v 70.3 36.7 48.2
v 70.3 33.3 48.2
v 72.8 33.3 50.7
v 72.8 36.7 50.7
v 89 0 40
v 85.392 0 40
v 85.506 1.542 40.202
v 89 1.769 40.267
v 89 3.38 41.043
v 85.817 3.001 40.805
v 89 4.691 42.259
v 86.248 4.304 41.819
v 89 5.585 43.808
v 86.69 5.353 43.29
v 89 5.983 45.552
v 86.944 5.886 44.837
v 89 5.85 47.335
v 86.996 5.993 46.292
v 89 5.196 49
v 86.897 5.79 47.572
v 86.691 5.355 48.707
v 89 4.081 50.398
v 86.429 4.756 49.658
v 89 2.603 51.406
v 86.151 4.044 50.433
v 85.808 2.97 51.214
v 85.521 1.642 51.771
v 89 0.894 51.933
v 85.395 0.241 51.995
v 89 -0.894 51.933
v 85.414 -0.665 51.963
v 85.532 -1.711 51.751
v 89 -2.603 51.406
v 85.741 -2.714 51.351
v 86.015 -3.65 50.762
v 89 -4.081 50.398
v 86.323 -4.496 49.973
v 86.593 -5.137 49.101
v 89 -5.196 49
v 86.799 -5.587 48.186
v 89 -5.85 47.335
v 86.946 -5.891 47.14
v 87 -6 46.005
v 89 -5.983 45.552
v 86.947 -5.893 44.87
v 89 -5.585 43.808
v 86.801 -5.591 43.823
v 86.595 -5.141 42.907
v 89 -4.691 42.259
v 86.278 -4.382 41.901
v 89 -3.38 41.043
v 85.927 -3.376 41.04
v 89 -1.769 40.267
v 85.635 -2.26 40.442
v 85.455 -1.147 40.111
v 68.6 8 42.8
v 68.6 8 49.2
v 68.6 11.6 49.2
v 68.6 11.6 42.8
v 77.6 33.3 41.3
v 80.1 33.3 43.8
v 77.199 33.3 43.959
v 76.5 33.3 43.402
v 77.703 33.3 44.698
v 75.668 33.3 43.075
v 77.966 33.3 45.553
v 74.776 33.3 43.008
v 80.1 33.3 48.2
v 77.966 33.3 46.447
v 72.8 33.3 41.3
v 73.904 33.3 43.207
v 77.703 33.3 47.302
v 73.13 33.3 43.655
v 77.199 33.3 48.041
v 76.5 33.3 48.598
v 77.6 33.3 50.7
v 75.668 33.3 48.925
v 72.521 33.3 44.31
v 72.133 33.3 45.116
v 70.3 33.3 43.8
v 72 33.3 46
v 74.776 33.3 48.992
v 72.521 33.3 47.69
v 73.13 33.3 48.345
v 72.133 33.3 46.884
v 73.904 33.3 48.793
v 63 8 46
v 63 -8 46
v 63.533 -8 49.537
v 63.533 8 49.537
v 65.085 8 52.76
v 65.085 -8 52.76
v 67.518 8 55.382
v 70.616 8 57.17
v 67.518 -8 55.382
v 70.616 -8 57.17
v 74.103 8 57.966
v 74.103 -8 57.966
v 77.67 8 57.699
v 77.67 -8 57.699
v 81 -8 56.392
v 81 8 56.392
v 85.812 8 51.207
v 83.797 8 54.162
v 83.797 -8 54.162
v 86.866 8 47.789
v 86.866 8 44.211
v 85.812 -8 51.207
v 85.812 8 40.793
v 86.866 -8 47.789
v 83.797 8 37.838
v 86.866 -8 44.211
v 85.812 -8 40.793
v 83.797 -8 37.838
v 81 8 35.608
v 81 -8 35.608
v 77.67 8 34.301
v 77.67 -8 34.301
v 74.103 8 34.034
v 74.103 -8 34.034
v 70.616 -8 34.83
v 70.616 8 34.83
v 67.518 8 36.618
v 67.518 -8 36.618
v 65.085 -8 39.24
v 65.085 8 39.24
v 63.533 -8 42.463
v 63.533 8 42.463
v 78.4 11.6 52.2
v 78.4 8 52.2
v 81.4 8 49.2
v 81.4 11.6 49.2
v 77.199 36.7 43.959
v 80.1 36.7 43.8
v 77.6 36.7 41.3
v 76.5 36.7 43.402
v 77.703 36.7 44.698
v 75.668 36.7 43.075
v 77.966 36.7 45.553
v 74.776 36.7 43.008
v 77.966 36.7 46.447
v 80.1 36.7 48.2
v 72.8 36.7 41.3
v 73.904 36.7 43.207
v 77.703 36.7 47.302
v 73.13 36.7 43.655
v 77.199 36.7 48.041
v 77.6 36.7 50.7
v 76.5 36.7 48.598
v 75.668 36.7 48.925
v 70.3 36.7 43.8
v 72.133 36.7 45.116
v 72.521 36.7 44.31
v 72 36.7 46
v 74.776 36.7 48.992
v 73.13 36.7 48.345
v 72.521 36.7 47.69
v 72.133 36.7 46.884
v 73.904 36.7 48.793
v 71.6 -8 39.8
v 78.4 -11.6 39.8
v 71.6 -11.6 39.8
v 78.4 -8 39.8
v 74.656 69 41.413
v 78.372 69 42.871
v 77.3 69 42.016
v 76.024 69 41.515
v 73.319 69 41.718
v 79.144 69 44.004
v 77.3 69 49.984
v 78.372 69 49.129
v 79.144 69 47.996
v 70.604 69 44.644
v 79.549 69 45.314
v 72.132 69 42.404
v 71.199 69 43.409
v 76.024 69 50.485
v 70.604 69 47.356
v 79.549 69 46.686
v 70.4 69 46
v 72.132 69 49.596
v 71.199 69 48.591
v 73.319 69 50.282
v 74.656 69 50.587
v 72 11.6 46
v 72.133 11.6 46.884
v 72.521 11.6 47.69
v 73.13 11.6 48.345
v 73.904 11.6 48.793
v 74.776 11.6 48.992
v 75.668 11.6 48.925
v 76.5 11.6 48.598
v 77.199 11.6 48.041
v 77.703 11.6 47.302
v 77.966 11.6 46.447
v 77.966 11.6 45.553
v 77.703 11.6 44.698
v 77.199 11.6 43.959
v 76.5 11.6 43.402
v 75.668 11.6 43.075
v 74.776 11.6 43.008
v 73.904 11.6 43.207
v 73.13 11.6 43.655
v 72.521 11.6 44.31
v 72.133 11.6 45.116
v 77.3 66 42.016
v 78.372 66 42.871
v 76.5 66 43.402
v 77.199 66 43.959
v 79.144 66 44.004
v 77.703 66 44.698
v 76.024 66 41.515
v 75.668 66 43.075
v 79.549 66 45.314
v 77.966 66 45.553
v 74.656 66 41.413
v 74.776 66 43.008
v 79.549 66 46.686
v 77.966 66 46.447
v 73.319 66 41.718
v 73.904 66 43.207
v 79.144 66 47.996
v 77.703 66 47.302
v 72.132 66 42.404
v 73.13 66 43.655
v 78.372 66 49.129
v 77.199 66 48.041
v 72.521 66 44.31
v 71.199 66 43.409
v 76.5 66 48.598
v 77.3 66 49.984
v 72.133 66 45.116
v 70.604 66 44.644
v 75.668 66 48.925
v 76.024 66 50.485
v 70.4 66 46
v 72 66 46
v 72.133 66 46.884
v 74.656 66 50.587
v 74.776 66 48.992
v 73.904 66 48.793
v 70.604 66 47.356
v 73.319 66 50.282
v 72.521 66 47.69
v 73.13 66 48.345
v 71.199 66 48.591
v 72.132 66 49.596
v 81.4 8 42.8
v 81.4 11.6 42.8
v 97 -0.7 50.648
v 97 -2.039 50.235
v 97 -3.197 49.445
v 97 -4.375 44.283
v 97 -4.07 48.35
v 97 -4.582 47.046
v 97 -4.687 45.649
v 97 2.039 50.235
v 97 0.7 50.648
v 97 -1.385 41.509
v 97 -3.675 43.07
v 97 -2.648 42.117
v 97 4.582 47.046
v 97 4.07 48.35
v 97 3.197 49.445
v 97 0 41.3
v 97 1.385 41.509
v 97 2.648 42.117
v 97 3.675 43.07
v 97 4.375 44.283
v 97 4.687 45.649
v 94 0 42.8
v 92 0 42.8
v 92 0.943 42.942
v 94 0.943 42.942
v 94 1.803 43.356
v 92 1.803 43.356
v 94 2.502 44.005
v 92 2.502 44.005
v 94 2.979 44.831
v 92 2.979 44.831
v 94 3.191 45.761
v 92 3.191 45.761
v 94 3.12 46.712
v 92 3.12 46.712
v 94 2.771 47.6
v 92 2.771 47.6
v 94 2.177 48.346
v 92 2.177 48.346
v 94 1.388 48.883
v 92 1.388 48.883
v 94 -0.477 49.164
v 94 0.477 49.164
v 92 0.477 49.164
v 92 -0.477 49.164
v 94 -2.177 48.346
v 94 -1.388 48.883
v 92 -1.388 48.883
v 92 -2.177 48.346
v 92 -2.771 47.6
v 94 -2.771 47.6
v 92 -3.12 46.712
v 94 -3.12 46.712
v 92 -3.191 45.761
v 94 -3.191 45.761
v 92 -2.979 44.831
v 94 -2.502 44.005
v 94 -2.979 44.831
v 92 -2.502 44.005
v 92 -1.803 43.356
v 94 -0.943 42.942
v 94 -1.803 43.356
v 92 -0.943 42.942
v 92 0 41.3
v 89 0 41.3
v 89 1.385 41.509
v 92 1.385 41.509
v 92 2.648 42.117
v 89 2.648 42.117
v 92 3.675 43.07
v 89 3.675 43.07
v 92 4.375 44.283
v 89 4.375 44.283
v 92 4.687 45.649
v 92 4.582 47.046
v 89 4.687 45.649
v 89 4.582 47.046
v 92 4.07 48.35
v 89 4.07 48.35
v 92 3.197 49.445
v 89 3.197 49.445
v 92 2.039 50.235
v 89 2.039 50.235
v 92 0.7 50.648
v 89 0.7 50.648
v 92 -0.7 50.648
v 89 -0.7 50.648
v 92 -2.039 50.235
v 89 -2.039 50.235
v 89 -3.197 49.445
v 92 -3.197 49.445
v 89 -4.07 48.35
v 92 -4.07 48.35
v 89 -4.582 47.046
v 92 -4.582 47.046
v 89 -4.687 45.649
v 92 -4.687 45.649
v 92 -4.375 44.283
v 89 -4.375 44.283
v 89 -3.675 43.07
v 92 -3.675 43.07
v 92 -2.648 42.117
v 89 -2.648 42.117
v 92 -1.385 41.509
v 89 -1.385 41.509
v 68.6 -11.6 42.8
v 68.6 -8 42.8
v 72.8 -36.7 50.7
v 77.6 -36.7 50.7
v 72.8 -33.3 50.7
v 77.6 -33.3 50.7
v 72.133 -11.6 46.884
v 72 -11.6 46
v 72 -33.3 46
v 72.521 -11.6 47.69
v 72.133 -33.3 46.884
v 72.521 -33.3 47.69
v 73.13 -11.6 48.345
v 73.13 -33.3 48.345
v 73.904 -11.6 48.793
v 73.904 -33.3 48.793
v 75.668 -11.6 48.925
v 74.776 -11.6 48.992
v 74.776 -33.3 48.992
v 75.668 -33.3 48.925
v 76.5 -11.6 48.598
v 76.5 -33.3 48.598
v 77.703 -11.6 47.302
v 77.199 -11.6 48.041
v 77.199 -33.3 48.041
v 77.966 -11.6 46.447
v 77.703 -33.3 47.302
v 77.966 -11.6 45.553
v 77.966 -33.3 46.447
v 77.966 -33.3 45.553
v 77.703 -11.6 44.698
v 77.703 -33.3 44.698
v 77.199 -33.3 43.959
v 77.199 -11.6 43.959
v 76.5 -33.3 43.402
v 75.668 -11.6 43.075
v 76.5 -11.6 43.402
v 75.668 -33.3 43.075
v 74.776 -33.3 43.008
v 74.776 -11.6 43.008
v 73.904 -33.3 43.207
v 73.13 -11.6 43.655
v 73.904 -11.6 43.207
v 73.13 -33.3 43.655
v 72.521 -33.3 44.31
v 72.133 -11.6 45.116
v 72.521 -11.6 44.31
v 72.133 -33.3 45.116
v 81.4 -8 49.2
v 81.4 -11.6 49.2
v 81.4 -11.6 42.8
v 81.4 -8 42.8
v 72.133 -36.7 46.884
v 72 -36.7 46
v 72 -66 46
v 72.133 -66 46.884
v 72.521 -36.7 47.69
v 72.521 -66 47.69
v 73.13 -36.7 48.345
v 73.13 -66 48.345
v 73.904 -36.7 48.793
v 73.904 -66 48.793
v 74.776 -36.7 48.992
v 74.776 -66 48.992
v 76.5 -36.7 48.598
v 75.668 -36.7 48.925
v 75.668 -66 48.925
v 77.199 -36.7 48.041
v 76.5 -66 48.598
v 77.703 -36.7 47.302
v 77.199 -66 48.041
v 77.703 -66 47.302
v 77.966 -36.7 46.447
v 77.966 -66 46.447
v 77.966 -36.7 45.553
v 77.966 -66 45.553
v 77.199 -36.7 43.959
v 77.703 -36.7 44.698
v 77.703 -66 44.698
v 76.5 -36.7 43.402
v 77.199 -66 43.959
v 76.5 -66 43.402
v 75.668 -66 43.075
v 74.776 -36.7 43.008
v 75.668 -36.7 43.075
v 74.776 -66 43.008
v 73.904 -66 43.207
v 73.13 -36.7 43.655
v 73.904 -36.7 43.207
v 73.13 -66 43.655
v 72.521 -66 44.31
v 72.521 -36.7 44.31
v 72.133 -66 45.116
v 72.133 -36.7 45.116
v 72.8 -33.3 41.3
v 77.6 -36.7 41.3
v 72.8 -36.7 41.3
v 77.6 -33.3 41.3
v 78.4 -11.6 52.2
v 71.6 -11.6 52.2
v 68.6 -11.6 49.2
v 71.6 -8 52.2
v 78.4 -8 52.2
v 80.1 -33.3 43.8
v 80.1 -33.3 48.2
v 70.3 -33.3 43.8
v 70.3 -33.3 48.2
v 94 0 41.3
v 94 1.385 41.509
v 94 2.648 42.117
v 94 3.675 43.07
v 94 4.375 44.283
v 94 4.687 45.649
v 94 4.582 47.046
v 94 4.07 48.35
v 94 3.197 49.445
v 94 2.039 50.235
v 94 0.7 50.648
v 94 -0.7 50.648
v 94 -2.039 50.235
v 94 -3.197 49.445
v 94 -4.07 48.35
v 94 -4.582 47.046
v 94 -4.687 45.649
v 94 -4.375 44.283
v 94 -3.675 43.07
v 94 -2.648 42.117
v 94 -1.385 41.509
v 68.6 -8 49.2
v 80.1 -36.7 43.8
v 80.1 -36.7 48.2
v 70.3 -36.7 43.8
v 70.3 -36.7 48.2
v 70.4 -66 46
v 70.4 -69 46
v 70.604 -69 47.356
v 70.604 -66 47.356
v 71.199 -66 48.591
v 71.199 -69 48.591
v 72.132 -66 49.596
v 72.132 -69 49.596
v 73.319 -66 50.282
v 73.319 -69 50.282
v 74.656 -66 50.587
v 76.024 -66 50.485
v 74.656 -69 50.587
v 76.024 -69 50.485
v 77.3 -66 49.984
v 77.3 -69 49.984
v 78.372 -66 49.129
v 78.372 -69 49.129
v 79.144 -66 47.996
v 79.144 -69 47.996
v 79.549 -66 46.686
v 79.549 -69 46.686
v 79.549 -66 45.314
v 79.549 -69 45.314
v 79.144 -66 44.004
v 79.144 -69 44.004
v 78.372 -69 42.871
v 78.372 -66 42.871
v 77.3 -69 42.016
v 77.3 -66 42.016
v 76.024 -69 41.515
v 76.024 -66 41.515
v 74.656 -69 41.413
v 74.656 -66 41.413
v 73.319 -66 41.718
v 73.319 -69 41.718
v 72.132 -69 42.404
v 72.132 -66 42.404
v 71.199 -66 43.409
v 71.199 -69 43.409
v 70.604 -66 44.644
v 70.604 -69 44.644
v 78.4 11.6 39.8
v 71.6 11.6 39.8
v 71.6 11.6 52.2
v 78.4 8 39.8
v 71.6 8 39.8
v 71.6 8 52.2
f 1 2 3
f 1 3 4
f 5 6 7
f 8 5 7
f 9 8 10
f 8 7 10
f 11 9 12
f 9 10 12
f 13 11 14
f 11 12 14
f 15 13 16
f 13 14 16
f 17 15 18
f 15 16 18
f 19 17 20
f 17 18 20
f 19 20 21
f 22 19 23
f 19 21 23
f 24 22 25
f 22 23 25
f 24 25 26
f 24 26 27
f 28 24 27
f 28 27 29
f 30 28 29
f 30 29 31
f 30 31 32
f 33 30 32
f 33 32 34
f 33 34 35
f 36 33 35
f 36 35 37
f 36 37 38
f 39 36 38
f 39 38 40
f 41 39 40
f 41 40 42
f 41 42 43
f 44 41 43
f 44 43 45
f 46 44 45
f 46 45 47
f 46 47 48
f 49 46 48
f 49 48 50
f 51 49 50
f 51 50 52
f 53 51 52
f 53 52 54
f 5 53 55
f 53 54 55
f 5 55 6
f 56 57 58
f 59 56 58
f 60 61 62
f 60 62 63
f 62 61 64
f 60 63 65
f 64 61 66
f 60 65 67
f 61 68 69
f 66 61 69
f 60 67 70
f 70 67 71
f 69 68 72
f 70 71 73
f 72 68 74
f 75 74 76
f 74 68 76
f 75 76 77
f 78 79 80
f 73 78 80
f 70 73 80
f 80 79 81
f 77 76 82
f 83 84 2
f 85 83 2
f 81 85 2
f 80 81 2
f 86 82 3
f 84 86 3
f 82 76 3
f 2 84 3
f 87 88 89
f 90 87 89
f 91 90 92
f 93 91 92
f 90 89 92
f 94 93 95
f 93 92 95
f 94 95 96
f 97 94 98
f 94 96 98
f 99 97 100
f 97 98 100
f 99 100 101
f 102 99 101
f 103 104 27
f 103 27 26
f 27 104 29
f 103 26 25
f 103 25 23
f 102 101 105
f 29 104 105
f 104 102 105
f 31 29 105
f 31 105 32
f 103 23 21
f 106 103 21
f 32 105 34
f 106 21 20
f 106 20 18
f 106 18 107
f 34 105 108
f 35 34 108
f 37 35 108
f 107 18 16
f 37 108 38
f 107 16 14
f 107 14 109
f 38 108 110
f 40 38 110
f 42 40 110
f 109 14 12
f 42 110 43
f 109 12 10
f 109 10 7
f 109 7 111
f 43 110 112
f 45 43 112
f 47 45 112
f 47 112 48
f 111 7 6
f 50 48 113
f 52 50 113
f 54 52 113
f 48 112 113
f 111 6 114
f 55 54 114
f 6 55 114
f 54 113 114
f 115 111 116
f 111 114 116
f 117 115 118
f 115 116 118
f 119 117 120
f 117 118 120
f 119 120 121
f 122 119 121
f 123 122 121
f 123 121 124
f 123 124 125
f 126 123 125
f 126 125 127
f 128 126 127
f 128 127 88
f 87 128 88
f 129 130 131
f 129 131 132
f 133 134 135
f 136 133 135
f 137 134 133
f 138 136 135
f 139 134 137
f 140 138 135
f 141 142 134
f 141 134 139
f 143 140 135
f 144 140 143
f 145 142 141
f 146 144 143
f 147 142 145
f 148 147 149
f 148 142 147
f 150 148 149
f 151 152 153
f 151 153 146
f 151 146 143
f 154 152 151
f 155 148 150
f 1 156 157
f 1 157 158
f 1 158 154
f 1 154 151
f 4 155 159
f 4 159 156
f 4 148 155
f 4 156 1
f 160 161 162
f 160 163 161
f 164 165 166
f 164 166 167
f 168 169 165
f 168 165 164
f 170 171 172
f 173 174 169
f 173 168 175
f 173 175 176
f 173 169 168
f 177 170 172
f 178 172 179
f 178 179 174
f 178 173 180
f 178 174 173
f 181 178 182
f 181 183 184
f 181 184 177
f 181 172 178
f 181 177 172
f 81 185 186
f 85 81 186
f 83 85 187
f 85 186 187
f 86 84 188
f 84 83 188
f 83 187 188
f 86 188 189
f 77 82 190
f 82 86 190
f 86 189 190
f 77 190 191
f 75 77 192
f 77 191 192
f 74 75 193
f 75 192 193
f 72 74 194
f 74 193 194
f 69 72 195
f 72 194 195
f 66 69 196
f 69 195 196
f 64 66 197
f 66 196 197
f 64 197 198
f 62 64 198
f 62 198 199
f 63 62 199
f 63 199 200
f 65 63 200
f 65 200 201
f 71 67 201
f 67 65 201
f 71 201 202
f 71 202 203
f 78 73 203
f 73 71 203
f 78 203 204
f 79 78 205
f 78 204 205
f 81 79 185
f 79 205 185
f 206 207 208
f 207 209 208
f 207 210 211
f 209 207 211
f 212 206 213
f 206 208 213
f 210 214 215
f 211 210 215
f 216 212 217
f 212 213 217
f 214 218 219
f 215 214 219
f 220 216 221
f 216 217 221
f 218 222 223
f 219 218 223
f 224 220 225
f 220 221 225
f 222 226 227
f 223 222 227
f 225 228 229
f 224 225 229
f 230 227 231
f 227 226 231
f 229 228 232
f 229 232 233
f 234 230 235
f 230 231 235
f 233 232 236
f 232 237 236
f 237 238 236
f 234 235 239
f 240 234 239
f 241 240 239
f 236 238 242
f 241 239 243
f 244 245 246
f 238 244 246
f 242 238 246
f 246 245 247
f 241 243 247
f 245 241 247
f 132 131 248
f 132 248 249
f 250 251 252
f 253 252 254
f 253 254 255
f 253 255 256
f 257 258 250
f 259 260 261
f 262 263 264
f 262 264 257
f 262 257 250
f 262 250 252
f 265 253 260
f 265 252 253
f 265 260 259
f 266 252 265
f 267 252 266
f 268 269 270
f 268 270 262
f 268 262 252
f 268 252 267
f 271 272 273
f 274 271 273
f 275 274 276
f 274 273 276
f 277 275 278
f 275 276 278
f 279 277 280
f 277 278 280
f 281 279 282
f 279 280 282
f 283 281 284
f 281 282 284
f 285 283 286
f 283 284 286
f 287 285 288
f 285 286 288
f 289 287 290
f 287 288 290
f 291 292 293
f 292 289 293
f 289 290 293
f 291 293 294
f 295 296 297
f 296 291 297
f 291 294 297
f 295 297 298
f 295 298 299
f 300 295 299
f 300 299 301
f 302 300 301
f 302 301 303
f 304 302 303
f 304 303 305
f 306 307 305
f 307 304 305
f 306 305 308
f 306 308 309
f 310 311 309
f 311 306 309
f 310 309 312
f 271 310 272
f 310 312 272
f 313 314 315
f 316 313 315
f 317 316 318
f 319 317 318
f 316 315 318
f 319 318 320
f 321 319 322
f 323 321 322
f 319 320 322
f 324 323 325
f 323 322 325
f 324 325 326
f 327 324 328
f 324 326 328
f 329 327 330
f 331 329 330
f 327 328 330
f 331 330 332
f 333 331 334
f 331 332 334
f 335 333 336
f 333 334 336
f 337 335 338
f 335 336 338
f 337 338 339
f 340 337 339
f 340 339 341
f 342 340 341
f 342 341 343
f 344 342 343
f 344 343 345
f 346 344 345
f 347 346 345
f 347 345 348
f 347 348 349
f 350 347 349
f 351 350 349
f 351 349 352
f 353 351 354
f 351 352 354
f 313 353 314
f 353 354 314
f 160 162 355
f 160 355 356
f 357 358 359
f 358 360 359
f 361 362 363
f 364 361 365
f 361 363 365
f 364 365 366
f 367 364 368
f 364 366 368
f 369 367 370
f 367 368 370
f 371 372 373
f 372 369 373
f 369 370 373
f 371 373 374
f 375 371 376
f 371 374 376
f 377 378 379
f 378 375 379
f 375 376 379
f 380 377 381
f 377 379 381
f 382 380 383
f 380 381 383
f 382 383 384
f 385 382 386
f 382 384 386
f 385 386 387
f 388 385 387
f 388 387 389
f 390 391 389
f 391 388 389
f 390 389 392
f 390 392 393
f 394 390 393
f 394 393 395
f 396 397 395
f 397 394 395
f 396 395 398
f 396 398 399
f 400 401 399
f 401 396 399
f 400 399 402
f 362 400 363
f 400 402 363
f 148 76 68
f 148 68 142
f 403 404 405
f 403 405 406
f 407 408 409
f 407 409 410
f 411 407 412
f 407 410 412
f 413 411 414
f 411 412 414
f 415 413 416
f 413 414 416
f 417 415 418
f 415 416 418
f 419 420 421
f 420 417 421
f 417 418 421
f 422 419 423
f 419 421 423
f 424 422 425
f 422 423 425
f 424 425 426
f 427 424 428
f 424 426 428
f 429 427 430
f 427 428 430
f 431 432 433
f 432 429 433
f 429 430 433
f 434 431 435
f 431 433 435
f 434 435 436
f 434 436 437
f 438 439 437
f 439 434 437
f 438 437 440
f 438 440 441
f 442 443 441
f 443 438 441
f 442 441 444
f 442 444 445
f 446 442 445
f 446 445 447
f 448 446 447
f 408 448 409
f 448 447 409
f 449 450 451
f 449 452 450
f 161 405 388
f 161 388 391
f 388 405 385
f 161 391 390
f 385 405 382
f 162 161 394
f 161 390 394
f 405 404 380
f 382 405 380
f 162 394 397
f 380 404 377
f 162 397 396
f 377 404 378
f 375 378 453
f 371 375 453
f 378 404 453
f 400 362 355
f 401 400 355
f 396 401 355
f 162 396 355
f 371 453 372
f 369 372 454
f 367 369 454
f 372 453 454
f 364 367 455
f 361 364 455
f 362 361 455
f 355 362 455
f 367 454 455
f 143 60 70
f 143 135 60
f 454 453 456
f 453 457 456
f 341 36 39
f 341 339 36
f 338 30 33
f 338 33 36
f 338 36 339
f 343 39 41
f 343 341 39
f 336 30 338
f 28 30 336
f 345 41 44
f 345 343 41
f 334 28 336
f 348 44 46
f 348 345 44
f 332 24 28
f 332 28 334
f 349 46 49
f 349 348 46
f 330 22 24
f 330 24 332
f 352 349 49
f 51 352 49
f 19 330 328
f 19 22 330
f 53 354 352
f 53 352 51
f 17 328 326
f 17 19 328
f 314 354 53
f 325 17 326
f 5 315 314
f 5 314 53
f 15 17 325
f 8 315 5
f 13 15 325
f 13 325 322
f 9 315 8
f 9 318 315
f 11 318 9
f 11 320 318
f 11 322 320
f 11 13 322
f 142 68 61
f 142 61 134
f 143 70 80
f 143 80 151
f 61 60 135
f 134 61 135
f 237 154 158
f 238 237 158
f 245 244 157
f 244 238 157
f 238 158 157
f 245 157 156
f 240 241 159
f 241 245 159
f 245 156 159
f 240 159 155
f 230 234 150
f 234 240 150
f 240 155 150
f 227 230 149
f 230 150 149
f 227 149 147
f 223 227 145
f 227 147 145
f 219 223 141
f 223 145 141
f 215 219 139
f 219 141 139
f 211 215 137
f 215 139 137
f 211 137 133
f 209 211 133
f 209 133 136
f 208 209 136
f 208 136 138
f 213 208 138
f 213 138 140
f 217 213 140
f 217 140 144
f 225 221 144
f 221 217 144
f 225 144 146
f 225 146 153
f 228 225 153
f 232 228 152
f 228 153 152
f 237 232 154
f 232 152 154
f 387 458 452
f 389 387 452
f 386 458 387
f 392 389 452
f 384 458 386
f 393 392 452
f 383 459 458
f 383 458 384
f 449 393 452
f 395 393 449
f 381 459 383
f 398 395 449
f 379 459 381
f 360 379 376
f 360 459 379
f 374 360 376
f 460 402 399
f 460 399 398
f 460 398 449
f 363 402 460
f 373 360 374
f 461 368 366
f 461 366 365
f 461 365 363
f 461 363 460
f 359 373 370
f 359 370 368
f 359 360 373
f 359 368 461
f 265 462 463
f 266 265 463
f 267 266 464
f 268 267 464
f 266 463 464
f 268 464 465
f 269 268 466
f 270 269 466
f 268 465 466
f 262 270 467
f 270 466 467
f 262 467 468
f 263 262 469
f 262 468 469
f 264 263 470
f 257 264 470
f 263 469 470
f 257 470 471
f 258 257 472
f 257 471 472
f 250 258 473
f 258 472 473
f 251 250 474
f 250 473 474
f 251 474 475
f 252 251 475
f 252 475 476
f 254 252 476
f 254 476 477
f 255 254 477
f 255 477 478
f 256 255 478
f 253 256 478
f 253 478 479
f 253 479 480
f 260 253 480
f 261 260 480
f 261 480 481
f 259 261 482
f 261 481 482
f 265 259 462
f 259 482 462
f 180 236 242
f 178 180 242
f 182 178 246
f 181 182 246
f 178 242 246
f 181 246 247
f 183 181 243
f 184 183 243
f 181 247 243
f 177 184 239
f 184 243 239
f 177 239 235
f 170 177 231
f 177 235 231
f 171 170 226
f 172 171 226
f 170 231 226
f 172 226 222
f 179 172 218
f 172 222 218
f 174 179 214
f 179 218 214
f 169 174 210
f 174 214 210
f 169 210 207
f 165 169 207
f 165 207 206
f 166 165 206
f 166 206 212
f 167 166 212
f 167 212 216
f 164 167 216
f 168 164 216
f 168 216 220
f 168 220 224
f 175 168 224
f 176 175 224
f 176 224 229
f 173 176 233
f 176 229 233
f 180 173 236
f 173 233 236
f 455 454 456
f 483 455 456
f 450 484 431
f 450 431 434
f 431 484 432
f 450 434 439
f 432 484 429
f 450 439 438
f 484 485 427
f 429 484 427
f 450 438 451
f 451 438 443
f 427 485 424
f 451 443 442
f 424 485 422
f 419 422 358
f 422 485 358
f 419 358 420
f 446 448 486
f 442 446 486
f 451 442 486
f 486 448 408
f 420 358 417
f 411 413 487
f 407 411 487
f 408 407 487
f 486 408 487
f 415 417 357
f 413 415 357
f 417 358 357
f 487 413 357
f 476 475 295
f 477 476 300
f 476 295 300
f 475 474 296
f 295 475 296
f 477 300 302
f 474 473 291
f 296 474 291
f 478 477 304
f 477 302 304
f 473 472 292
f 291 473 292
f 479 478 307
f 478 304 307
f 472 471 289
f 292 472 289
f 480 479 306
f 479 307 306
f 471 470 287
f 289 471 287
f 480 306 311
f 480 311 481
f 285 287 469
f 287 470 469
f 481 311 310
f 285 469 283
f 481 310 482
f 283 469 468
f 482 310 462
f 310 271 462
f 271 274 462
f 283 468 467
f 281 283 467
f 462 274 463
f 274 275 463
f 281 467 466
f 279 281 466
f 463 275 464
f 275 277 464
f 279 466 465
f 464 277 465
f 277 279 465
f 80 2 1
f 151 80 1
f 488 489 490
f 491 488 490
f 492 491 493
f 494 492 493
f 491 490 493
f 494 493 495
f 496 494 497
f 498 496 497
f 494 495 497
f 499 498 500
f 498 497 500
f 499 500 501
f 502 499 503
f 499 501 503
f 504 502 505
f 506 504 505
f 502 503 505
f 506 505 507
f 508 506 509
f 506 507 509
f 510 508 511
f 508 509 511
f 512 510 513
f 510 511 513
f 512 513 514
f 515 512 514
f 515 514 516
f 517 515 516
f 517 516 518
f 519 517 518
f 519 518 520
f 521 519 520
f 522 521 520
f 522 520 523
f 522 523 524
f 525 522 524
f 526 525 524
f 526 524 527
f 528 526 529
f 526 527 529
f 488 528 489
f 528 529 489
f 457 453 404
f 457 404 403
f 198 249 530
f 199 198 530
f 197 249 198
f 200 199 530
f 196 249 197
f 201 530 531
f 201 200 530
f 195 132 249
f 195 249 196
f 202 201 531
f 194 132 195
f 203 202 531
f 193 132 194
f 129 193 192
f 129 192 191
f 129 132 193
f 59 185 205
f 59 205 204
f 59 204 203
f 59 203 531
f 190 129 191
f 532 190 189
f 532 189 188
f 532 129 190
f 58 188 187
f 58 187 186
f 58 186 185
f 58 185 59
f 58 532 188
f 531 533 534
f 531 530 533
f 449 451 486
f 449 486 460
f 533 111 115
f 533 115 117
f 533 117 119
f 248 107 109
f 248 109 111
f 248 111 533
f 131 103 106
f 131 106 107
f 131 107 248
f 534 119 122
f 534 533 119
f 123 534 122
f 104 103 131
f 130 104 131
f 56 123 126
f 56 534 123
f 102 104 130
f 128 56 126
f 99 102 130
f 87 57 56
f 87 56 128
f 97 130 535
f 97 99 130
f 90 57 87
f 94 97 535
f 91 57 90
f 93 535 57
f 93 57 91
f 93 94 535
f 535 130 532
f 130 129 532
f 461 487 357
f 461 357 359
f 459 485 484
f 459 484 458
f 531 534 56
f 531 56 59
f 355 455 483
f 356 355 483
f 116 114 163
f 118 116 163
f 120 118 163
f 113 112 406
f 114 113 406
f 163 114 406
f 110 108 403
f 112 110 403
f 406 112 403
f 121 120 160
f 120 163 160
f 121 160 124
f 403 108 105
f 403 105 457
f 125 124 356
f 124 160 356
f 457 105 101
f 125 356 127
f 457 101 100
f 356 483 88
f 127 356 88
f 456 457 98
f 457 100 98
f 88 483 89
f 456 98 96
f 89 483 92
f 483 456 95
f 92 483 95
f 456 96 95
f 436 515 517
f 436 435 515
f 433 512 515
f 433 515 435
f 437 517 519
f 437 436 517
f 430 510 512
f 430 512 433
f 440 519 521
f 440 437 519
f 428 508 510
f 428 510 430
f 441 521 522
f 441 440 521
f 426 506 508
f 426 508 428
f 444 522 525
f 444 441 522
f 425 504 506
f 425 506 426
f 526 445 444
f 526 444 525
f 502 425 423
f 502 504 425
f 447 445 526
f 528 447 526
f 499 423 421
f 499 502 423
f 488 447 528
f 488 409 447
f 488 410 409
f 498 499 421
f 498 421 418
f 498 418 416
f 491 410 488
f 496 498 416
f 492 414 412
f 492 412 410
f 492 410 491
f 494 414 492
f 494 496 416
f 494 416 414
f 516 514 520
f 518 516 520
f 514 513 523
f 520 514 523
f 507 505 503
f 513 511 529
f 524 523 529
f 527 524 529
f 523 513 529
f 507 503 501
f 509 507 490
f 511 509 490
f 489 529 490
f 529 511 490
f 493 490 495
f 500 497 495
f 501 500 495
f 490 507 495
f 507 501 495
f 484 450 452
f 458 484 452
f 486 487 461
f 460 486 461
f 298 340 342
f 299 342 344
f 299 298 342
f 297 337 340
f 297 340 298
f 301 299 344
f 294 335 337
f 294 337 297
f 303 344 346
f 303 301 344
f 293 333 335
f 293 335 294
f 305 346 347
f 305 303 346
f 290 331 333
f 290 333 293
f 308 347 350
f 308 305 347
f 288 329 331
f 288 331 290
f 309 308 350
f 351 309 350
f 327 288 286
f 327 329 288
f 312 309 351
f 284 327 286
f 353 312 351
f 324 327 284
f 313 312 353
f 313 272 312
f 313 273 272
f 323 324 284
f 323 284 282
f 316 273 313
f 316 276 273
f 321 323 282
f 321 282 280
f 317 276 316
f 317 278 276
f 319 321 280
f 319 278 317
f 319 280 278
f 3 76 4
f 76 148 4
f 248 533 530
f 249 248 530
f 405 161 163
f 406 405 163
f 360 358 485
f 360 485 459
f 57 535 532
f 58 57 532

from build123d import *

# Parameters (mm, degrees)
BOX197_W                                          = 9.8
BOX197_H                                          = 3.4
BOX197_DEPTH                                      = 9.4
CHAMFER218_SIZE                                   = 2.5
CYLINDER692_R                                     = 3
CYLINDER692_DEPTH                                 = 138
CYLINDER688_R                                     = 4.7
CYLINDER688_DEPTH                                 = 3
CYLINDER689_R                                     = 3.2
CYLINDER689_DEPTH                                 = 8
CYLINDER687_R                                     = 4.7
CYLINDER687_DEPTH                                 = 3
CYLINDER686_R                                     = 6
CYLINDER686_DEPTH                                 = 5.5
FUSION088026007031024007017_PLACEMENT_ANGLE       = 180
BOX250_W                                          = 12.8
BOX250_H                                          = 3.6
BOX250_DEPTH                                      = 12.4
CHAMFER228009_SIZE                                = 3
BOX251_W                                          = 12.8
BOX251_H                                          = 3.6
BOX251_DEPTH                                      = 12.4
CHAMFER228008_SIZE                                = 3
CYLINDER685_R                                     = 12
CYLINDER685_DEPTH                                 = 16
CYLINDER690_R                                     = 4.6
CYLINDER690_DEPTH                                 = 3
CYLINDER691_R                                     = 4.6
CYLINDER691_DEPTH                                 = 3
BOX198_W                                          = 9.8
BOX198_H                                          = 3.4
BOX198_DEPTH                                      = 9.4
CHAMFER219_SIZE                                   = 2.5
FUSION088026007031024007008004058_PLACEMENT_ANGLE = 180


with BuildPart() as chamfer218:
    # Box197 → Box197 (new body)
    with BuildSketch(Plane(origin=(2.4, 22.8, 2.8), x_dir=(1, 0, 0), z_dir=(0, 0, 1))):
        with Locations((4.9, 1.7)):
            Rectangle(BOX197_W, BOX197_H)
    extrude(amount=BOX197_DEPTH)

    # Chamfer218
    chamfer218_edges = [chamfer218.edges().sort_by_distance(p)[0] for p in [
        (2.4, 24.5, 12.2),
        (2.4, 24.5, 2.8),
        (12.2, 24.5, 12.2),
        (12.2, 24.5, 2.8),
    ]]
    chamfer(chamfer218_edges, length=CHAMFER218_SIZE)


with BuildPart() as chamfer218_1:
    # Chamfer218 placement: moved
    add(chamfer218.part.moved(Location((-7.5, 33.5, -7.5))))


with BuildPart() as cylinder692:
    # Cylinder692 → Cylinder692 (new body)
    with BuildSketch(Plane(origin=(0, 24, 0), x_dir=(1, 0, 0), z_dir=(0, 1, 0))):
        Circle(CYLINDER692_R)
    extrude(amount=CYLINDER692_DEPTH)


with BuildPart() as cylinder688:
    # Cylinder688 → Cylinder688 (new body)
    with BuildSketch(Plane(origin=(26.5, 52, 7.5), x_dir=(0, 0, -1), z_dir=(1, 0, 0))):
        Circle(CYLINDER688_R)
    extrude(amount=CYLINDER688_DEPTH)


with BuildPart() as cylinder689:
    # Cylinder689 → Cylinder689 (new body)
    with BuildSketch(Plane(origin=(21.5, 52, 7.5), x_dir=(0, 0, -1), z_dir=(1, 0, 0))):
        Circle(CYLINDER689_R)
    extrude(amount=CYLINDER689_DEPTH)


with BuildPart() as cylinder687:
    # Cylinder687 → Cylinder687 (new body)
    with BuildSketch(Plane(origin=(21.5, 52, 7.5), x_dir=(0, 0, -1), z_dir=(1, 0, 0))):
        Circle(CYLINDER687_R)
    extrude(amount=CYLINDER687_DEPTH)


with BuildPart() as pinion_bearings_carving003:
    # Cylinder686 → Cylinder686 (new body)
    with BuildSketch(Plane(origin=(16, 52, 7.5), x_dir=(0, 0, -1), z_dir=(1, 0, 0))):
        Circle(CYLINDER686_R)
    extrude(amount=CYLINDER686_DEPTH)

    # Fusion088026007031024007017: union Cylinder688, Cylinder689, Cylinder687
    add(cylinder688.part)
    add(cylinder689.part)
    add(cylinder687.part)


with BuildPart() as pinion_bearings_carving003_1:
    # Fusion088026007031024007017 placement: moved
    add(pinion_bearings_carving003.part.moved(Location((7.5, 41, 7.5))).rotate(Axis((7.5, 41, 7.5), (0, 1, 0)), FUSION088026007031024007017_PLACEMENT_ANGLE))


with BuildPart() as chamfer228009:
    # Box250 → Box250 (new body)
    with BuildSketch(Plane(origin=(1.1, 21.9, 1.3), x_dir=(1, 0, 0), z_dir=(0, 0, 1))):
        with Locations((6.4, 1.8)):
            Rectangle(BOX250_W, BOX250_H)
    extrude(amount=BOX250_DEPTH)

    # Chamfer228009
    chamfer228009_edges = [chamfer228009.edges().sort_by_distance(p)[0] for p in [
        (1.1, 23.7, 13.7),
        (1.1, 23.7, 1.3),
        (13.9, 23.7, 13.7),
        (13.9, 23.7, 1.3),
    ]]
    chamfer(chamfer228009_edges, length=CHAMFER228009_SIZE)


with BuildPart() as chamfer228009_1:
    # Chamfer228009 placement: moved
    add(chamfer228009.part.moved(Location((-7.5, 59.5, -7.5))))


with BuildPart() as chamfer228008:
    # Box251 → Box251 (new body)
    with BuildSketch(Plane(origin=(1.1, 21.5, 1.3), x_dir=(1, 0, 0), z_dir=(0, 0, 1))):
        with Locations((6.4, 1.8)):
            Rectangle(BOX251_W, BOX251_H)
    extrude(amount=BOX251_DEPTH)

    # Chamfer228008
    chamfer228008_edges = [chamfer228008.edges().sort_by_distance(p)[0] for p in [
        (1.1, 23.3, 13.7),
        (1.1, 23.3, 1.3),
        (13.9, 23.3, 13.7),
        (13.9, 23.3, 1.3),
    ]]
    chamfer(chamfer228008_edges, length=CHAMFER228008_SIZE)


with BuildPart() as chamfer228008_1:
    # Chamfer228008 placement: moved
    add(chamfer228008.part.moved(Location((-7.5, 79.5, -7.5))))


with BuildPart() as cylinder685:
    # Cylinder685 → Cylinder685 (new body)
    with BuildSketch(Plane(origin=(0, 85, 0), x_dir=(1, 0, 0), z_dir=(0, 1, 0))):
        Circle(CYLINDER685_R)
    extrude(amount=CYLINDER685_DEPTH)


with BuildPart() as cylinder690:
    # Cylinder690 → Cylinder690 (new body)
    with BuildSketch(Plane(origin=(0, 24, 0), x_dir=(1, 0, 0), z_dir=(0, 1, 0))):
        Circle(CYLINDER690_R)
    extrude(amount=CYLINDER690_DEPTH)


with BuildPart() as cylinder691:
    # Cylinder691 → Cylinder691 (new body)
    with BuildSketch(Plane(origin=(0, 159, 0), x_dir=(1, 0, 0), z_dir=(0, 1, 0))):
        Circle(CYLINDER691_R)
    extrude(amount=CYLINDER691_DEPTH)


with BuildPart() as inner_carving_rear:
    # Box198 → Box198 (new body)
    with BuildSketch(Plane(origin=(2.4, 22.8, 2.8), x_dir=(1, 0, 0), z_dir=(0, 0, 1))):
        with Locations((4.9, 1.7)):
            Rectangle(BOX198_W, BOX198_H)
    extrude(amount=BOX198_DEPTH)

    # Chamfer219
    chamfer219_edges = [inner_carving_rear.edges().sort_by_distance(p)[0] for p in [
        (2.4, 24.5, 12.2),
        (2.4, 24.5, 2.8),
        (12.2, 24.5, 12.2),
        (12.2, 24.5, 2.8),
    ]]
    chamfer(chamfer219_edges, length=CHAMFER219_SIZE)


with BuildPart() as inner_carving_rear_1:
    # Chamfer219 placement: moved
    add(inner_carving_rear.part.moved(Location((-7.5, 103.5, -7.5))))

    # Fusion088026007031024007008004058: union Chamfer218, Cylinder692, pinion-bearings-carving003, Chamfer228009, Chamfer228008, Cylinder685, Cylinder690, Cylinder691
    add(chamfer218_1.part)
    add(cylinder692.part)
    add(pinion_bearings_carving003_1.part)
    add(chamfer228009_1.part)
    add(chamfer228008_1.part)
    add(cylinder685.part)
    add(cylinder690.part)
    add(cylinder691.part)


with BuildPart() as inner_carving_rear_2:
    # Fusion088026007031024007008004058 placement: moved
    add(inner_carving_rear_1.part.moved(Location((75, -93, 46))).rotate(Axis((75, -93, 46), (0, 1, 0)), FUSION088026007031024007008004058_PLACEMENT_ANGLE))


solid = inner_carving_rear_2.part
